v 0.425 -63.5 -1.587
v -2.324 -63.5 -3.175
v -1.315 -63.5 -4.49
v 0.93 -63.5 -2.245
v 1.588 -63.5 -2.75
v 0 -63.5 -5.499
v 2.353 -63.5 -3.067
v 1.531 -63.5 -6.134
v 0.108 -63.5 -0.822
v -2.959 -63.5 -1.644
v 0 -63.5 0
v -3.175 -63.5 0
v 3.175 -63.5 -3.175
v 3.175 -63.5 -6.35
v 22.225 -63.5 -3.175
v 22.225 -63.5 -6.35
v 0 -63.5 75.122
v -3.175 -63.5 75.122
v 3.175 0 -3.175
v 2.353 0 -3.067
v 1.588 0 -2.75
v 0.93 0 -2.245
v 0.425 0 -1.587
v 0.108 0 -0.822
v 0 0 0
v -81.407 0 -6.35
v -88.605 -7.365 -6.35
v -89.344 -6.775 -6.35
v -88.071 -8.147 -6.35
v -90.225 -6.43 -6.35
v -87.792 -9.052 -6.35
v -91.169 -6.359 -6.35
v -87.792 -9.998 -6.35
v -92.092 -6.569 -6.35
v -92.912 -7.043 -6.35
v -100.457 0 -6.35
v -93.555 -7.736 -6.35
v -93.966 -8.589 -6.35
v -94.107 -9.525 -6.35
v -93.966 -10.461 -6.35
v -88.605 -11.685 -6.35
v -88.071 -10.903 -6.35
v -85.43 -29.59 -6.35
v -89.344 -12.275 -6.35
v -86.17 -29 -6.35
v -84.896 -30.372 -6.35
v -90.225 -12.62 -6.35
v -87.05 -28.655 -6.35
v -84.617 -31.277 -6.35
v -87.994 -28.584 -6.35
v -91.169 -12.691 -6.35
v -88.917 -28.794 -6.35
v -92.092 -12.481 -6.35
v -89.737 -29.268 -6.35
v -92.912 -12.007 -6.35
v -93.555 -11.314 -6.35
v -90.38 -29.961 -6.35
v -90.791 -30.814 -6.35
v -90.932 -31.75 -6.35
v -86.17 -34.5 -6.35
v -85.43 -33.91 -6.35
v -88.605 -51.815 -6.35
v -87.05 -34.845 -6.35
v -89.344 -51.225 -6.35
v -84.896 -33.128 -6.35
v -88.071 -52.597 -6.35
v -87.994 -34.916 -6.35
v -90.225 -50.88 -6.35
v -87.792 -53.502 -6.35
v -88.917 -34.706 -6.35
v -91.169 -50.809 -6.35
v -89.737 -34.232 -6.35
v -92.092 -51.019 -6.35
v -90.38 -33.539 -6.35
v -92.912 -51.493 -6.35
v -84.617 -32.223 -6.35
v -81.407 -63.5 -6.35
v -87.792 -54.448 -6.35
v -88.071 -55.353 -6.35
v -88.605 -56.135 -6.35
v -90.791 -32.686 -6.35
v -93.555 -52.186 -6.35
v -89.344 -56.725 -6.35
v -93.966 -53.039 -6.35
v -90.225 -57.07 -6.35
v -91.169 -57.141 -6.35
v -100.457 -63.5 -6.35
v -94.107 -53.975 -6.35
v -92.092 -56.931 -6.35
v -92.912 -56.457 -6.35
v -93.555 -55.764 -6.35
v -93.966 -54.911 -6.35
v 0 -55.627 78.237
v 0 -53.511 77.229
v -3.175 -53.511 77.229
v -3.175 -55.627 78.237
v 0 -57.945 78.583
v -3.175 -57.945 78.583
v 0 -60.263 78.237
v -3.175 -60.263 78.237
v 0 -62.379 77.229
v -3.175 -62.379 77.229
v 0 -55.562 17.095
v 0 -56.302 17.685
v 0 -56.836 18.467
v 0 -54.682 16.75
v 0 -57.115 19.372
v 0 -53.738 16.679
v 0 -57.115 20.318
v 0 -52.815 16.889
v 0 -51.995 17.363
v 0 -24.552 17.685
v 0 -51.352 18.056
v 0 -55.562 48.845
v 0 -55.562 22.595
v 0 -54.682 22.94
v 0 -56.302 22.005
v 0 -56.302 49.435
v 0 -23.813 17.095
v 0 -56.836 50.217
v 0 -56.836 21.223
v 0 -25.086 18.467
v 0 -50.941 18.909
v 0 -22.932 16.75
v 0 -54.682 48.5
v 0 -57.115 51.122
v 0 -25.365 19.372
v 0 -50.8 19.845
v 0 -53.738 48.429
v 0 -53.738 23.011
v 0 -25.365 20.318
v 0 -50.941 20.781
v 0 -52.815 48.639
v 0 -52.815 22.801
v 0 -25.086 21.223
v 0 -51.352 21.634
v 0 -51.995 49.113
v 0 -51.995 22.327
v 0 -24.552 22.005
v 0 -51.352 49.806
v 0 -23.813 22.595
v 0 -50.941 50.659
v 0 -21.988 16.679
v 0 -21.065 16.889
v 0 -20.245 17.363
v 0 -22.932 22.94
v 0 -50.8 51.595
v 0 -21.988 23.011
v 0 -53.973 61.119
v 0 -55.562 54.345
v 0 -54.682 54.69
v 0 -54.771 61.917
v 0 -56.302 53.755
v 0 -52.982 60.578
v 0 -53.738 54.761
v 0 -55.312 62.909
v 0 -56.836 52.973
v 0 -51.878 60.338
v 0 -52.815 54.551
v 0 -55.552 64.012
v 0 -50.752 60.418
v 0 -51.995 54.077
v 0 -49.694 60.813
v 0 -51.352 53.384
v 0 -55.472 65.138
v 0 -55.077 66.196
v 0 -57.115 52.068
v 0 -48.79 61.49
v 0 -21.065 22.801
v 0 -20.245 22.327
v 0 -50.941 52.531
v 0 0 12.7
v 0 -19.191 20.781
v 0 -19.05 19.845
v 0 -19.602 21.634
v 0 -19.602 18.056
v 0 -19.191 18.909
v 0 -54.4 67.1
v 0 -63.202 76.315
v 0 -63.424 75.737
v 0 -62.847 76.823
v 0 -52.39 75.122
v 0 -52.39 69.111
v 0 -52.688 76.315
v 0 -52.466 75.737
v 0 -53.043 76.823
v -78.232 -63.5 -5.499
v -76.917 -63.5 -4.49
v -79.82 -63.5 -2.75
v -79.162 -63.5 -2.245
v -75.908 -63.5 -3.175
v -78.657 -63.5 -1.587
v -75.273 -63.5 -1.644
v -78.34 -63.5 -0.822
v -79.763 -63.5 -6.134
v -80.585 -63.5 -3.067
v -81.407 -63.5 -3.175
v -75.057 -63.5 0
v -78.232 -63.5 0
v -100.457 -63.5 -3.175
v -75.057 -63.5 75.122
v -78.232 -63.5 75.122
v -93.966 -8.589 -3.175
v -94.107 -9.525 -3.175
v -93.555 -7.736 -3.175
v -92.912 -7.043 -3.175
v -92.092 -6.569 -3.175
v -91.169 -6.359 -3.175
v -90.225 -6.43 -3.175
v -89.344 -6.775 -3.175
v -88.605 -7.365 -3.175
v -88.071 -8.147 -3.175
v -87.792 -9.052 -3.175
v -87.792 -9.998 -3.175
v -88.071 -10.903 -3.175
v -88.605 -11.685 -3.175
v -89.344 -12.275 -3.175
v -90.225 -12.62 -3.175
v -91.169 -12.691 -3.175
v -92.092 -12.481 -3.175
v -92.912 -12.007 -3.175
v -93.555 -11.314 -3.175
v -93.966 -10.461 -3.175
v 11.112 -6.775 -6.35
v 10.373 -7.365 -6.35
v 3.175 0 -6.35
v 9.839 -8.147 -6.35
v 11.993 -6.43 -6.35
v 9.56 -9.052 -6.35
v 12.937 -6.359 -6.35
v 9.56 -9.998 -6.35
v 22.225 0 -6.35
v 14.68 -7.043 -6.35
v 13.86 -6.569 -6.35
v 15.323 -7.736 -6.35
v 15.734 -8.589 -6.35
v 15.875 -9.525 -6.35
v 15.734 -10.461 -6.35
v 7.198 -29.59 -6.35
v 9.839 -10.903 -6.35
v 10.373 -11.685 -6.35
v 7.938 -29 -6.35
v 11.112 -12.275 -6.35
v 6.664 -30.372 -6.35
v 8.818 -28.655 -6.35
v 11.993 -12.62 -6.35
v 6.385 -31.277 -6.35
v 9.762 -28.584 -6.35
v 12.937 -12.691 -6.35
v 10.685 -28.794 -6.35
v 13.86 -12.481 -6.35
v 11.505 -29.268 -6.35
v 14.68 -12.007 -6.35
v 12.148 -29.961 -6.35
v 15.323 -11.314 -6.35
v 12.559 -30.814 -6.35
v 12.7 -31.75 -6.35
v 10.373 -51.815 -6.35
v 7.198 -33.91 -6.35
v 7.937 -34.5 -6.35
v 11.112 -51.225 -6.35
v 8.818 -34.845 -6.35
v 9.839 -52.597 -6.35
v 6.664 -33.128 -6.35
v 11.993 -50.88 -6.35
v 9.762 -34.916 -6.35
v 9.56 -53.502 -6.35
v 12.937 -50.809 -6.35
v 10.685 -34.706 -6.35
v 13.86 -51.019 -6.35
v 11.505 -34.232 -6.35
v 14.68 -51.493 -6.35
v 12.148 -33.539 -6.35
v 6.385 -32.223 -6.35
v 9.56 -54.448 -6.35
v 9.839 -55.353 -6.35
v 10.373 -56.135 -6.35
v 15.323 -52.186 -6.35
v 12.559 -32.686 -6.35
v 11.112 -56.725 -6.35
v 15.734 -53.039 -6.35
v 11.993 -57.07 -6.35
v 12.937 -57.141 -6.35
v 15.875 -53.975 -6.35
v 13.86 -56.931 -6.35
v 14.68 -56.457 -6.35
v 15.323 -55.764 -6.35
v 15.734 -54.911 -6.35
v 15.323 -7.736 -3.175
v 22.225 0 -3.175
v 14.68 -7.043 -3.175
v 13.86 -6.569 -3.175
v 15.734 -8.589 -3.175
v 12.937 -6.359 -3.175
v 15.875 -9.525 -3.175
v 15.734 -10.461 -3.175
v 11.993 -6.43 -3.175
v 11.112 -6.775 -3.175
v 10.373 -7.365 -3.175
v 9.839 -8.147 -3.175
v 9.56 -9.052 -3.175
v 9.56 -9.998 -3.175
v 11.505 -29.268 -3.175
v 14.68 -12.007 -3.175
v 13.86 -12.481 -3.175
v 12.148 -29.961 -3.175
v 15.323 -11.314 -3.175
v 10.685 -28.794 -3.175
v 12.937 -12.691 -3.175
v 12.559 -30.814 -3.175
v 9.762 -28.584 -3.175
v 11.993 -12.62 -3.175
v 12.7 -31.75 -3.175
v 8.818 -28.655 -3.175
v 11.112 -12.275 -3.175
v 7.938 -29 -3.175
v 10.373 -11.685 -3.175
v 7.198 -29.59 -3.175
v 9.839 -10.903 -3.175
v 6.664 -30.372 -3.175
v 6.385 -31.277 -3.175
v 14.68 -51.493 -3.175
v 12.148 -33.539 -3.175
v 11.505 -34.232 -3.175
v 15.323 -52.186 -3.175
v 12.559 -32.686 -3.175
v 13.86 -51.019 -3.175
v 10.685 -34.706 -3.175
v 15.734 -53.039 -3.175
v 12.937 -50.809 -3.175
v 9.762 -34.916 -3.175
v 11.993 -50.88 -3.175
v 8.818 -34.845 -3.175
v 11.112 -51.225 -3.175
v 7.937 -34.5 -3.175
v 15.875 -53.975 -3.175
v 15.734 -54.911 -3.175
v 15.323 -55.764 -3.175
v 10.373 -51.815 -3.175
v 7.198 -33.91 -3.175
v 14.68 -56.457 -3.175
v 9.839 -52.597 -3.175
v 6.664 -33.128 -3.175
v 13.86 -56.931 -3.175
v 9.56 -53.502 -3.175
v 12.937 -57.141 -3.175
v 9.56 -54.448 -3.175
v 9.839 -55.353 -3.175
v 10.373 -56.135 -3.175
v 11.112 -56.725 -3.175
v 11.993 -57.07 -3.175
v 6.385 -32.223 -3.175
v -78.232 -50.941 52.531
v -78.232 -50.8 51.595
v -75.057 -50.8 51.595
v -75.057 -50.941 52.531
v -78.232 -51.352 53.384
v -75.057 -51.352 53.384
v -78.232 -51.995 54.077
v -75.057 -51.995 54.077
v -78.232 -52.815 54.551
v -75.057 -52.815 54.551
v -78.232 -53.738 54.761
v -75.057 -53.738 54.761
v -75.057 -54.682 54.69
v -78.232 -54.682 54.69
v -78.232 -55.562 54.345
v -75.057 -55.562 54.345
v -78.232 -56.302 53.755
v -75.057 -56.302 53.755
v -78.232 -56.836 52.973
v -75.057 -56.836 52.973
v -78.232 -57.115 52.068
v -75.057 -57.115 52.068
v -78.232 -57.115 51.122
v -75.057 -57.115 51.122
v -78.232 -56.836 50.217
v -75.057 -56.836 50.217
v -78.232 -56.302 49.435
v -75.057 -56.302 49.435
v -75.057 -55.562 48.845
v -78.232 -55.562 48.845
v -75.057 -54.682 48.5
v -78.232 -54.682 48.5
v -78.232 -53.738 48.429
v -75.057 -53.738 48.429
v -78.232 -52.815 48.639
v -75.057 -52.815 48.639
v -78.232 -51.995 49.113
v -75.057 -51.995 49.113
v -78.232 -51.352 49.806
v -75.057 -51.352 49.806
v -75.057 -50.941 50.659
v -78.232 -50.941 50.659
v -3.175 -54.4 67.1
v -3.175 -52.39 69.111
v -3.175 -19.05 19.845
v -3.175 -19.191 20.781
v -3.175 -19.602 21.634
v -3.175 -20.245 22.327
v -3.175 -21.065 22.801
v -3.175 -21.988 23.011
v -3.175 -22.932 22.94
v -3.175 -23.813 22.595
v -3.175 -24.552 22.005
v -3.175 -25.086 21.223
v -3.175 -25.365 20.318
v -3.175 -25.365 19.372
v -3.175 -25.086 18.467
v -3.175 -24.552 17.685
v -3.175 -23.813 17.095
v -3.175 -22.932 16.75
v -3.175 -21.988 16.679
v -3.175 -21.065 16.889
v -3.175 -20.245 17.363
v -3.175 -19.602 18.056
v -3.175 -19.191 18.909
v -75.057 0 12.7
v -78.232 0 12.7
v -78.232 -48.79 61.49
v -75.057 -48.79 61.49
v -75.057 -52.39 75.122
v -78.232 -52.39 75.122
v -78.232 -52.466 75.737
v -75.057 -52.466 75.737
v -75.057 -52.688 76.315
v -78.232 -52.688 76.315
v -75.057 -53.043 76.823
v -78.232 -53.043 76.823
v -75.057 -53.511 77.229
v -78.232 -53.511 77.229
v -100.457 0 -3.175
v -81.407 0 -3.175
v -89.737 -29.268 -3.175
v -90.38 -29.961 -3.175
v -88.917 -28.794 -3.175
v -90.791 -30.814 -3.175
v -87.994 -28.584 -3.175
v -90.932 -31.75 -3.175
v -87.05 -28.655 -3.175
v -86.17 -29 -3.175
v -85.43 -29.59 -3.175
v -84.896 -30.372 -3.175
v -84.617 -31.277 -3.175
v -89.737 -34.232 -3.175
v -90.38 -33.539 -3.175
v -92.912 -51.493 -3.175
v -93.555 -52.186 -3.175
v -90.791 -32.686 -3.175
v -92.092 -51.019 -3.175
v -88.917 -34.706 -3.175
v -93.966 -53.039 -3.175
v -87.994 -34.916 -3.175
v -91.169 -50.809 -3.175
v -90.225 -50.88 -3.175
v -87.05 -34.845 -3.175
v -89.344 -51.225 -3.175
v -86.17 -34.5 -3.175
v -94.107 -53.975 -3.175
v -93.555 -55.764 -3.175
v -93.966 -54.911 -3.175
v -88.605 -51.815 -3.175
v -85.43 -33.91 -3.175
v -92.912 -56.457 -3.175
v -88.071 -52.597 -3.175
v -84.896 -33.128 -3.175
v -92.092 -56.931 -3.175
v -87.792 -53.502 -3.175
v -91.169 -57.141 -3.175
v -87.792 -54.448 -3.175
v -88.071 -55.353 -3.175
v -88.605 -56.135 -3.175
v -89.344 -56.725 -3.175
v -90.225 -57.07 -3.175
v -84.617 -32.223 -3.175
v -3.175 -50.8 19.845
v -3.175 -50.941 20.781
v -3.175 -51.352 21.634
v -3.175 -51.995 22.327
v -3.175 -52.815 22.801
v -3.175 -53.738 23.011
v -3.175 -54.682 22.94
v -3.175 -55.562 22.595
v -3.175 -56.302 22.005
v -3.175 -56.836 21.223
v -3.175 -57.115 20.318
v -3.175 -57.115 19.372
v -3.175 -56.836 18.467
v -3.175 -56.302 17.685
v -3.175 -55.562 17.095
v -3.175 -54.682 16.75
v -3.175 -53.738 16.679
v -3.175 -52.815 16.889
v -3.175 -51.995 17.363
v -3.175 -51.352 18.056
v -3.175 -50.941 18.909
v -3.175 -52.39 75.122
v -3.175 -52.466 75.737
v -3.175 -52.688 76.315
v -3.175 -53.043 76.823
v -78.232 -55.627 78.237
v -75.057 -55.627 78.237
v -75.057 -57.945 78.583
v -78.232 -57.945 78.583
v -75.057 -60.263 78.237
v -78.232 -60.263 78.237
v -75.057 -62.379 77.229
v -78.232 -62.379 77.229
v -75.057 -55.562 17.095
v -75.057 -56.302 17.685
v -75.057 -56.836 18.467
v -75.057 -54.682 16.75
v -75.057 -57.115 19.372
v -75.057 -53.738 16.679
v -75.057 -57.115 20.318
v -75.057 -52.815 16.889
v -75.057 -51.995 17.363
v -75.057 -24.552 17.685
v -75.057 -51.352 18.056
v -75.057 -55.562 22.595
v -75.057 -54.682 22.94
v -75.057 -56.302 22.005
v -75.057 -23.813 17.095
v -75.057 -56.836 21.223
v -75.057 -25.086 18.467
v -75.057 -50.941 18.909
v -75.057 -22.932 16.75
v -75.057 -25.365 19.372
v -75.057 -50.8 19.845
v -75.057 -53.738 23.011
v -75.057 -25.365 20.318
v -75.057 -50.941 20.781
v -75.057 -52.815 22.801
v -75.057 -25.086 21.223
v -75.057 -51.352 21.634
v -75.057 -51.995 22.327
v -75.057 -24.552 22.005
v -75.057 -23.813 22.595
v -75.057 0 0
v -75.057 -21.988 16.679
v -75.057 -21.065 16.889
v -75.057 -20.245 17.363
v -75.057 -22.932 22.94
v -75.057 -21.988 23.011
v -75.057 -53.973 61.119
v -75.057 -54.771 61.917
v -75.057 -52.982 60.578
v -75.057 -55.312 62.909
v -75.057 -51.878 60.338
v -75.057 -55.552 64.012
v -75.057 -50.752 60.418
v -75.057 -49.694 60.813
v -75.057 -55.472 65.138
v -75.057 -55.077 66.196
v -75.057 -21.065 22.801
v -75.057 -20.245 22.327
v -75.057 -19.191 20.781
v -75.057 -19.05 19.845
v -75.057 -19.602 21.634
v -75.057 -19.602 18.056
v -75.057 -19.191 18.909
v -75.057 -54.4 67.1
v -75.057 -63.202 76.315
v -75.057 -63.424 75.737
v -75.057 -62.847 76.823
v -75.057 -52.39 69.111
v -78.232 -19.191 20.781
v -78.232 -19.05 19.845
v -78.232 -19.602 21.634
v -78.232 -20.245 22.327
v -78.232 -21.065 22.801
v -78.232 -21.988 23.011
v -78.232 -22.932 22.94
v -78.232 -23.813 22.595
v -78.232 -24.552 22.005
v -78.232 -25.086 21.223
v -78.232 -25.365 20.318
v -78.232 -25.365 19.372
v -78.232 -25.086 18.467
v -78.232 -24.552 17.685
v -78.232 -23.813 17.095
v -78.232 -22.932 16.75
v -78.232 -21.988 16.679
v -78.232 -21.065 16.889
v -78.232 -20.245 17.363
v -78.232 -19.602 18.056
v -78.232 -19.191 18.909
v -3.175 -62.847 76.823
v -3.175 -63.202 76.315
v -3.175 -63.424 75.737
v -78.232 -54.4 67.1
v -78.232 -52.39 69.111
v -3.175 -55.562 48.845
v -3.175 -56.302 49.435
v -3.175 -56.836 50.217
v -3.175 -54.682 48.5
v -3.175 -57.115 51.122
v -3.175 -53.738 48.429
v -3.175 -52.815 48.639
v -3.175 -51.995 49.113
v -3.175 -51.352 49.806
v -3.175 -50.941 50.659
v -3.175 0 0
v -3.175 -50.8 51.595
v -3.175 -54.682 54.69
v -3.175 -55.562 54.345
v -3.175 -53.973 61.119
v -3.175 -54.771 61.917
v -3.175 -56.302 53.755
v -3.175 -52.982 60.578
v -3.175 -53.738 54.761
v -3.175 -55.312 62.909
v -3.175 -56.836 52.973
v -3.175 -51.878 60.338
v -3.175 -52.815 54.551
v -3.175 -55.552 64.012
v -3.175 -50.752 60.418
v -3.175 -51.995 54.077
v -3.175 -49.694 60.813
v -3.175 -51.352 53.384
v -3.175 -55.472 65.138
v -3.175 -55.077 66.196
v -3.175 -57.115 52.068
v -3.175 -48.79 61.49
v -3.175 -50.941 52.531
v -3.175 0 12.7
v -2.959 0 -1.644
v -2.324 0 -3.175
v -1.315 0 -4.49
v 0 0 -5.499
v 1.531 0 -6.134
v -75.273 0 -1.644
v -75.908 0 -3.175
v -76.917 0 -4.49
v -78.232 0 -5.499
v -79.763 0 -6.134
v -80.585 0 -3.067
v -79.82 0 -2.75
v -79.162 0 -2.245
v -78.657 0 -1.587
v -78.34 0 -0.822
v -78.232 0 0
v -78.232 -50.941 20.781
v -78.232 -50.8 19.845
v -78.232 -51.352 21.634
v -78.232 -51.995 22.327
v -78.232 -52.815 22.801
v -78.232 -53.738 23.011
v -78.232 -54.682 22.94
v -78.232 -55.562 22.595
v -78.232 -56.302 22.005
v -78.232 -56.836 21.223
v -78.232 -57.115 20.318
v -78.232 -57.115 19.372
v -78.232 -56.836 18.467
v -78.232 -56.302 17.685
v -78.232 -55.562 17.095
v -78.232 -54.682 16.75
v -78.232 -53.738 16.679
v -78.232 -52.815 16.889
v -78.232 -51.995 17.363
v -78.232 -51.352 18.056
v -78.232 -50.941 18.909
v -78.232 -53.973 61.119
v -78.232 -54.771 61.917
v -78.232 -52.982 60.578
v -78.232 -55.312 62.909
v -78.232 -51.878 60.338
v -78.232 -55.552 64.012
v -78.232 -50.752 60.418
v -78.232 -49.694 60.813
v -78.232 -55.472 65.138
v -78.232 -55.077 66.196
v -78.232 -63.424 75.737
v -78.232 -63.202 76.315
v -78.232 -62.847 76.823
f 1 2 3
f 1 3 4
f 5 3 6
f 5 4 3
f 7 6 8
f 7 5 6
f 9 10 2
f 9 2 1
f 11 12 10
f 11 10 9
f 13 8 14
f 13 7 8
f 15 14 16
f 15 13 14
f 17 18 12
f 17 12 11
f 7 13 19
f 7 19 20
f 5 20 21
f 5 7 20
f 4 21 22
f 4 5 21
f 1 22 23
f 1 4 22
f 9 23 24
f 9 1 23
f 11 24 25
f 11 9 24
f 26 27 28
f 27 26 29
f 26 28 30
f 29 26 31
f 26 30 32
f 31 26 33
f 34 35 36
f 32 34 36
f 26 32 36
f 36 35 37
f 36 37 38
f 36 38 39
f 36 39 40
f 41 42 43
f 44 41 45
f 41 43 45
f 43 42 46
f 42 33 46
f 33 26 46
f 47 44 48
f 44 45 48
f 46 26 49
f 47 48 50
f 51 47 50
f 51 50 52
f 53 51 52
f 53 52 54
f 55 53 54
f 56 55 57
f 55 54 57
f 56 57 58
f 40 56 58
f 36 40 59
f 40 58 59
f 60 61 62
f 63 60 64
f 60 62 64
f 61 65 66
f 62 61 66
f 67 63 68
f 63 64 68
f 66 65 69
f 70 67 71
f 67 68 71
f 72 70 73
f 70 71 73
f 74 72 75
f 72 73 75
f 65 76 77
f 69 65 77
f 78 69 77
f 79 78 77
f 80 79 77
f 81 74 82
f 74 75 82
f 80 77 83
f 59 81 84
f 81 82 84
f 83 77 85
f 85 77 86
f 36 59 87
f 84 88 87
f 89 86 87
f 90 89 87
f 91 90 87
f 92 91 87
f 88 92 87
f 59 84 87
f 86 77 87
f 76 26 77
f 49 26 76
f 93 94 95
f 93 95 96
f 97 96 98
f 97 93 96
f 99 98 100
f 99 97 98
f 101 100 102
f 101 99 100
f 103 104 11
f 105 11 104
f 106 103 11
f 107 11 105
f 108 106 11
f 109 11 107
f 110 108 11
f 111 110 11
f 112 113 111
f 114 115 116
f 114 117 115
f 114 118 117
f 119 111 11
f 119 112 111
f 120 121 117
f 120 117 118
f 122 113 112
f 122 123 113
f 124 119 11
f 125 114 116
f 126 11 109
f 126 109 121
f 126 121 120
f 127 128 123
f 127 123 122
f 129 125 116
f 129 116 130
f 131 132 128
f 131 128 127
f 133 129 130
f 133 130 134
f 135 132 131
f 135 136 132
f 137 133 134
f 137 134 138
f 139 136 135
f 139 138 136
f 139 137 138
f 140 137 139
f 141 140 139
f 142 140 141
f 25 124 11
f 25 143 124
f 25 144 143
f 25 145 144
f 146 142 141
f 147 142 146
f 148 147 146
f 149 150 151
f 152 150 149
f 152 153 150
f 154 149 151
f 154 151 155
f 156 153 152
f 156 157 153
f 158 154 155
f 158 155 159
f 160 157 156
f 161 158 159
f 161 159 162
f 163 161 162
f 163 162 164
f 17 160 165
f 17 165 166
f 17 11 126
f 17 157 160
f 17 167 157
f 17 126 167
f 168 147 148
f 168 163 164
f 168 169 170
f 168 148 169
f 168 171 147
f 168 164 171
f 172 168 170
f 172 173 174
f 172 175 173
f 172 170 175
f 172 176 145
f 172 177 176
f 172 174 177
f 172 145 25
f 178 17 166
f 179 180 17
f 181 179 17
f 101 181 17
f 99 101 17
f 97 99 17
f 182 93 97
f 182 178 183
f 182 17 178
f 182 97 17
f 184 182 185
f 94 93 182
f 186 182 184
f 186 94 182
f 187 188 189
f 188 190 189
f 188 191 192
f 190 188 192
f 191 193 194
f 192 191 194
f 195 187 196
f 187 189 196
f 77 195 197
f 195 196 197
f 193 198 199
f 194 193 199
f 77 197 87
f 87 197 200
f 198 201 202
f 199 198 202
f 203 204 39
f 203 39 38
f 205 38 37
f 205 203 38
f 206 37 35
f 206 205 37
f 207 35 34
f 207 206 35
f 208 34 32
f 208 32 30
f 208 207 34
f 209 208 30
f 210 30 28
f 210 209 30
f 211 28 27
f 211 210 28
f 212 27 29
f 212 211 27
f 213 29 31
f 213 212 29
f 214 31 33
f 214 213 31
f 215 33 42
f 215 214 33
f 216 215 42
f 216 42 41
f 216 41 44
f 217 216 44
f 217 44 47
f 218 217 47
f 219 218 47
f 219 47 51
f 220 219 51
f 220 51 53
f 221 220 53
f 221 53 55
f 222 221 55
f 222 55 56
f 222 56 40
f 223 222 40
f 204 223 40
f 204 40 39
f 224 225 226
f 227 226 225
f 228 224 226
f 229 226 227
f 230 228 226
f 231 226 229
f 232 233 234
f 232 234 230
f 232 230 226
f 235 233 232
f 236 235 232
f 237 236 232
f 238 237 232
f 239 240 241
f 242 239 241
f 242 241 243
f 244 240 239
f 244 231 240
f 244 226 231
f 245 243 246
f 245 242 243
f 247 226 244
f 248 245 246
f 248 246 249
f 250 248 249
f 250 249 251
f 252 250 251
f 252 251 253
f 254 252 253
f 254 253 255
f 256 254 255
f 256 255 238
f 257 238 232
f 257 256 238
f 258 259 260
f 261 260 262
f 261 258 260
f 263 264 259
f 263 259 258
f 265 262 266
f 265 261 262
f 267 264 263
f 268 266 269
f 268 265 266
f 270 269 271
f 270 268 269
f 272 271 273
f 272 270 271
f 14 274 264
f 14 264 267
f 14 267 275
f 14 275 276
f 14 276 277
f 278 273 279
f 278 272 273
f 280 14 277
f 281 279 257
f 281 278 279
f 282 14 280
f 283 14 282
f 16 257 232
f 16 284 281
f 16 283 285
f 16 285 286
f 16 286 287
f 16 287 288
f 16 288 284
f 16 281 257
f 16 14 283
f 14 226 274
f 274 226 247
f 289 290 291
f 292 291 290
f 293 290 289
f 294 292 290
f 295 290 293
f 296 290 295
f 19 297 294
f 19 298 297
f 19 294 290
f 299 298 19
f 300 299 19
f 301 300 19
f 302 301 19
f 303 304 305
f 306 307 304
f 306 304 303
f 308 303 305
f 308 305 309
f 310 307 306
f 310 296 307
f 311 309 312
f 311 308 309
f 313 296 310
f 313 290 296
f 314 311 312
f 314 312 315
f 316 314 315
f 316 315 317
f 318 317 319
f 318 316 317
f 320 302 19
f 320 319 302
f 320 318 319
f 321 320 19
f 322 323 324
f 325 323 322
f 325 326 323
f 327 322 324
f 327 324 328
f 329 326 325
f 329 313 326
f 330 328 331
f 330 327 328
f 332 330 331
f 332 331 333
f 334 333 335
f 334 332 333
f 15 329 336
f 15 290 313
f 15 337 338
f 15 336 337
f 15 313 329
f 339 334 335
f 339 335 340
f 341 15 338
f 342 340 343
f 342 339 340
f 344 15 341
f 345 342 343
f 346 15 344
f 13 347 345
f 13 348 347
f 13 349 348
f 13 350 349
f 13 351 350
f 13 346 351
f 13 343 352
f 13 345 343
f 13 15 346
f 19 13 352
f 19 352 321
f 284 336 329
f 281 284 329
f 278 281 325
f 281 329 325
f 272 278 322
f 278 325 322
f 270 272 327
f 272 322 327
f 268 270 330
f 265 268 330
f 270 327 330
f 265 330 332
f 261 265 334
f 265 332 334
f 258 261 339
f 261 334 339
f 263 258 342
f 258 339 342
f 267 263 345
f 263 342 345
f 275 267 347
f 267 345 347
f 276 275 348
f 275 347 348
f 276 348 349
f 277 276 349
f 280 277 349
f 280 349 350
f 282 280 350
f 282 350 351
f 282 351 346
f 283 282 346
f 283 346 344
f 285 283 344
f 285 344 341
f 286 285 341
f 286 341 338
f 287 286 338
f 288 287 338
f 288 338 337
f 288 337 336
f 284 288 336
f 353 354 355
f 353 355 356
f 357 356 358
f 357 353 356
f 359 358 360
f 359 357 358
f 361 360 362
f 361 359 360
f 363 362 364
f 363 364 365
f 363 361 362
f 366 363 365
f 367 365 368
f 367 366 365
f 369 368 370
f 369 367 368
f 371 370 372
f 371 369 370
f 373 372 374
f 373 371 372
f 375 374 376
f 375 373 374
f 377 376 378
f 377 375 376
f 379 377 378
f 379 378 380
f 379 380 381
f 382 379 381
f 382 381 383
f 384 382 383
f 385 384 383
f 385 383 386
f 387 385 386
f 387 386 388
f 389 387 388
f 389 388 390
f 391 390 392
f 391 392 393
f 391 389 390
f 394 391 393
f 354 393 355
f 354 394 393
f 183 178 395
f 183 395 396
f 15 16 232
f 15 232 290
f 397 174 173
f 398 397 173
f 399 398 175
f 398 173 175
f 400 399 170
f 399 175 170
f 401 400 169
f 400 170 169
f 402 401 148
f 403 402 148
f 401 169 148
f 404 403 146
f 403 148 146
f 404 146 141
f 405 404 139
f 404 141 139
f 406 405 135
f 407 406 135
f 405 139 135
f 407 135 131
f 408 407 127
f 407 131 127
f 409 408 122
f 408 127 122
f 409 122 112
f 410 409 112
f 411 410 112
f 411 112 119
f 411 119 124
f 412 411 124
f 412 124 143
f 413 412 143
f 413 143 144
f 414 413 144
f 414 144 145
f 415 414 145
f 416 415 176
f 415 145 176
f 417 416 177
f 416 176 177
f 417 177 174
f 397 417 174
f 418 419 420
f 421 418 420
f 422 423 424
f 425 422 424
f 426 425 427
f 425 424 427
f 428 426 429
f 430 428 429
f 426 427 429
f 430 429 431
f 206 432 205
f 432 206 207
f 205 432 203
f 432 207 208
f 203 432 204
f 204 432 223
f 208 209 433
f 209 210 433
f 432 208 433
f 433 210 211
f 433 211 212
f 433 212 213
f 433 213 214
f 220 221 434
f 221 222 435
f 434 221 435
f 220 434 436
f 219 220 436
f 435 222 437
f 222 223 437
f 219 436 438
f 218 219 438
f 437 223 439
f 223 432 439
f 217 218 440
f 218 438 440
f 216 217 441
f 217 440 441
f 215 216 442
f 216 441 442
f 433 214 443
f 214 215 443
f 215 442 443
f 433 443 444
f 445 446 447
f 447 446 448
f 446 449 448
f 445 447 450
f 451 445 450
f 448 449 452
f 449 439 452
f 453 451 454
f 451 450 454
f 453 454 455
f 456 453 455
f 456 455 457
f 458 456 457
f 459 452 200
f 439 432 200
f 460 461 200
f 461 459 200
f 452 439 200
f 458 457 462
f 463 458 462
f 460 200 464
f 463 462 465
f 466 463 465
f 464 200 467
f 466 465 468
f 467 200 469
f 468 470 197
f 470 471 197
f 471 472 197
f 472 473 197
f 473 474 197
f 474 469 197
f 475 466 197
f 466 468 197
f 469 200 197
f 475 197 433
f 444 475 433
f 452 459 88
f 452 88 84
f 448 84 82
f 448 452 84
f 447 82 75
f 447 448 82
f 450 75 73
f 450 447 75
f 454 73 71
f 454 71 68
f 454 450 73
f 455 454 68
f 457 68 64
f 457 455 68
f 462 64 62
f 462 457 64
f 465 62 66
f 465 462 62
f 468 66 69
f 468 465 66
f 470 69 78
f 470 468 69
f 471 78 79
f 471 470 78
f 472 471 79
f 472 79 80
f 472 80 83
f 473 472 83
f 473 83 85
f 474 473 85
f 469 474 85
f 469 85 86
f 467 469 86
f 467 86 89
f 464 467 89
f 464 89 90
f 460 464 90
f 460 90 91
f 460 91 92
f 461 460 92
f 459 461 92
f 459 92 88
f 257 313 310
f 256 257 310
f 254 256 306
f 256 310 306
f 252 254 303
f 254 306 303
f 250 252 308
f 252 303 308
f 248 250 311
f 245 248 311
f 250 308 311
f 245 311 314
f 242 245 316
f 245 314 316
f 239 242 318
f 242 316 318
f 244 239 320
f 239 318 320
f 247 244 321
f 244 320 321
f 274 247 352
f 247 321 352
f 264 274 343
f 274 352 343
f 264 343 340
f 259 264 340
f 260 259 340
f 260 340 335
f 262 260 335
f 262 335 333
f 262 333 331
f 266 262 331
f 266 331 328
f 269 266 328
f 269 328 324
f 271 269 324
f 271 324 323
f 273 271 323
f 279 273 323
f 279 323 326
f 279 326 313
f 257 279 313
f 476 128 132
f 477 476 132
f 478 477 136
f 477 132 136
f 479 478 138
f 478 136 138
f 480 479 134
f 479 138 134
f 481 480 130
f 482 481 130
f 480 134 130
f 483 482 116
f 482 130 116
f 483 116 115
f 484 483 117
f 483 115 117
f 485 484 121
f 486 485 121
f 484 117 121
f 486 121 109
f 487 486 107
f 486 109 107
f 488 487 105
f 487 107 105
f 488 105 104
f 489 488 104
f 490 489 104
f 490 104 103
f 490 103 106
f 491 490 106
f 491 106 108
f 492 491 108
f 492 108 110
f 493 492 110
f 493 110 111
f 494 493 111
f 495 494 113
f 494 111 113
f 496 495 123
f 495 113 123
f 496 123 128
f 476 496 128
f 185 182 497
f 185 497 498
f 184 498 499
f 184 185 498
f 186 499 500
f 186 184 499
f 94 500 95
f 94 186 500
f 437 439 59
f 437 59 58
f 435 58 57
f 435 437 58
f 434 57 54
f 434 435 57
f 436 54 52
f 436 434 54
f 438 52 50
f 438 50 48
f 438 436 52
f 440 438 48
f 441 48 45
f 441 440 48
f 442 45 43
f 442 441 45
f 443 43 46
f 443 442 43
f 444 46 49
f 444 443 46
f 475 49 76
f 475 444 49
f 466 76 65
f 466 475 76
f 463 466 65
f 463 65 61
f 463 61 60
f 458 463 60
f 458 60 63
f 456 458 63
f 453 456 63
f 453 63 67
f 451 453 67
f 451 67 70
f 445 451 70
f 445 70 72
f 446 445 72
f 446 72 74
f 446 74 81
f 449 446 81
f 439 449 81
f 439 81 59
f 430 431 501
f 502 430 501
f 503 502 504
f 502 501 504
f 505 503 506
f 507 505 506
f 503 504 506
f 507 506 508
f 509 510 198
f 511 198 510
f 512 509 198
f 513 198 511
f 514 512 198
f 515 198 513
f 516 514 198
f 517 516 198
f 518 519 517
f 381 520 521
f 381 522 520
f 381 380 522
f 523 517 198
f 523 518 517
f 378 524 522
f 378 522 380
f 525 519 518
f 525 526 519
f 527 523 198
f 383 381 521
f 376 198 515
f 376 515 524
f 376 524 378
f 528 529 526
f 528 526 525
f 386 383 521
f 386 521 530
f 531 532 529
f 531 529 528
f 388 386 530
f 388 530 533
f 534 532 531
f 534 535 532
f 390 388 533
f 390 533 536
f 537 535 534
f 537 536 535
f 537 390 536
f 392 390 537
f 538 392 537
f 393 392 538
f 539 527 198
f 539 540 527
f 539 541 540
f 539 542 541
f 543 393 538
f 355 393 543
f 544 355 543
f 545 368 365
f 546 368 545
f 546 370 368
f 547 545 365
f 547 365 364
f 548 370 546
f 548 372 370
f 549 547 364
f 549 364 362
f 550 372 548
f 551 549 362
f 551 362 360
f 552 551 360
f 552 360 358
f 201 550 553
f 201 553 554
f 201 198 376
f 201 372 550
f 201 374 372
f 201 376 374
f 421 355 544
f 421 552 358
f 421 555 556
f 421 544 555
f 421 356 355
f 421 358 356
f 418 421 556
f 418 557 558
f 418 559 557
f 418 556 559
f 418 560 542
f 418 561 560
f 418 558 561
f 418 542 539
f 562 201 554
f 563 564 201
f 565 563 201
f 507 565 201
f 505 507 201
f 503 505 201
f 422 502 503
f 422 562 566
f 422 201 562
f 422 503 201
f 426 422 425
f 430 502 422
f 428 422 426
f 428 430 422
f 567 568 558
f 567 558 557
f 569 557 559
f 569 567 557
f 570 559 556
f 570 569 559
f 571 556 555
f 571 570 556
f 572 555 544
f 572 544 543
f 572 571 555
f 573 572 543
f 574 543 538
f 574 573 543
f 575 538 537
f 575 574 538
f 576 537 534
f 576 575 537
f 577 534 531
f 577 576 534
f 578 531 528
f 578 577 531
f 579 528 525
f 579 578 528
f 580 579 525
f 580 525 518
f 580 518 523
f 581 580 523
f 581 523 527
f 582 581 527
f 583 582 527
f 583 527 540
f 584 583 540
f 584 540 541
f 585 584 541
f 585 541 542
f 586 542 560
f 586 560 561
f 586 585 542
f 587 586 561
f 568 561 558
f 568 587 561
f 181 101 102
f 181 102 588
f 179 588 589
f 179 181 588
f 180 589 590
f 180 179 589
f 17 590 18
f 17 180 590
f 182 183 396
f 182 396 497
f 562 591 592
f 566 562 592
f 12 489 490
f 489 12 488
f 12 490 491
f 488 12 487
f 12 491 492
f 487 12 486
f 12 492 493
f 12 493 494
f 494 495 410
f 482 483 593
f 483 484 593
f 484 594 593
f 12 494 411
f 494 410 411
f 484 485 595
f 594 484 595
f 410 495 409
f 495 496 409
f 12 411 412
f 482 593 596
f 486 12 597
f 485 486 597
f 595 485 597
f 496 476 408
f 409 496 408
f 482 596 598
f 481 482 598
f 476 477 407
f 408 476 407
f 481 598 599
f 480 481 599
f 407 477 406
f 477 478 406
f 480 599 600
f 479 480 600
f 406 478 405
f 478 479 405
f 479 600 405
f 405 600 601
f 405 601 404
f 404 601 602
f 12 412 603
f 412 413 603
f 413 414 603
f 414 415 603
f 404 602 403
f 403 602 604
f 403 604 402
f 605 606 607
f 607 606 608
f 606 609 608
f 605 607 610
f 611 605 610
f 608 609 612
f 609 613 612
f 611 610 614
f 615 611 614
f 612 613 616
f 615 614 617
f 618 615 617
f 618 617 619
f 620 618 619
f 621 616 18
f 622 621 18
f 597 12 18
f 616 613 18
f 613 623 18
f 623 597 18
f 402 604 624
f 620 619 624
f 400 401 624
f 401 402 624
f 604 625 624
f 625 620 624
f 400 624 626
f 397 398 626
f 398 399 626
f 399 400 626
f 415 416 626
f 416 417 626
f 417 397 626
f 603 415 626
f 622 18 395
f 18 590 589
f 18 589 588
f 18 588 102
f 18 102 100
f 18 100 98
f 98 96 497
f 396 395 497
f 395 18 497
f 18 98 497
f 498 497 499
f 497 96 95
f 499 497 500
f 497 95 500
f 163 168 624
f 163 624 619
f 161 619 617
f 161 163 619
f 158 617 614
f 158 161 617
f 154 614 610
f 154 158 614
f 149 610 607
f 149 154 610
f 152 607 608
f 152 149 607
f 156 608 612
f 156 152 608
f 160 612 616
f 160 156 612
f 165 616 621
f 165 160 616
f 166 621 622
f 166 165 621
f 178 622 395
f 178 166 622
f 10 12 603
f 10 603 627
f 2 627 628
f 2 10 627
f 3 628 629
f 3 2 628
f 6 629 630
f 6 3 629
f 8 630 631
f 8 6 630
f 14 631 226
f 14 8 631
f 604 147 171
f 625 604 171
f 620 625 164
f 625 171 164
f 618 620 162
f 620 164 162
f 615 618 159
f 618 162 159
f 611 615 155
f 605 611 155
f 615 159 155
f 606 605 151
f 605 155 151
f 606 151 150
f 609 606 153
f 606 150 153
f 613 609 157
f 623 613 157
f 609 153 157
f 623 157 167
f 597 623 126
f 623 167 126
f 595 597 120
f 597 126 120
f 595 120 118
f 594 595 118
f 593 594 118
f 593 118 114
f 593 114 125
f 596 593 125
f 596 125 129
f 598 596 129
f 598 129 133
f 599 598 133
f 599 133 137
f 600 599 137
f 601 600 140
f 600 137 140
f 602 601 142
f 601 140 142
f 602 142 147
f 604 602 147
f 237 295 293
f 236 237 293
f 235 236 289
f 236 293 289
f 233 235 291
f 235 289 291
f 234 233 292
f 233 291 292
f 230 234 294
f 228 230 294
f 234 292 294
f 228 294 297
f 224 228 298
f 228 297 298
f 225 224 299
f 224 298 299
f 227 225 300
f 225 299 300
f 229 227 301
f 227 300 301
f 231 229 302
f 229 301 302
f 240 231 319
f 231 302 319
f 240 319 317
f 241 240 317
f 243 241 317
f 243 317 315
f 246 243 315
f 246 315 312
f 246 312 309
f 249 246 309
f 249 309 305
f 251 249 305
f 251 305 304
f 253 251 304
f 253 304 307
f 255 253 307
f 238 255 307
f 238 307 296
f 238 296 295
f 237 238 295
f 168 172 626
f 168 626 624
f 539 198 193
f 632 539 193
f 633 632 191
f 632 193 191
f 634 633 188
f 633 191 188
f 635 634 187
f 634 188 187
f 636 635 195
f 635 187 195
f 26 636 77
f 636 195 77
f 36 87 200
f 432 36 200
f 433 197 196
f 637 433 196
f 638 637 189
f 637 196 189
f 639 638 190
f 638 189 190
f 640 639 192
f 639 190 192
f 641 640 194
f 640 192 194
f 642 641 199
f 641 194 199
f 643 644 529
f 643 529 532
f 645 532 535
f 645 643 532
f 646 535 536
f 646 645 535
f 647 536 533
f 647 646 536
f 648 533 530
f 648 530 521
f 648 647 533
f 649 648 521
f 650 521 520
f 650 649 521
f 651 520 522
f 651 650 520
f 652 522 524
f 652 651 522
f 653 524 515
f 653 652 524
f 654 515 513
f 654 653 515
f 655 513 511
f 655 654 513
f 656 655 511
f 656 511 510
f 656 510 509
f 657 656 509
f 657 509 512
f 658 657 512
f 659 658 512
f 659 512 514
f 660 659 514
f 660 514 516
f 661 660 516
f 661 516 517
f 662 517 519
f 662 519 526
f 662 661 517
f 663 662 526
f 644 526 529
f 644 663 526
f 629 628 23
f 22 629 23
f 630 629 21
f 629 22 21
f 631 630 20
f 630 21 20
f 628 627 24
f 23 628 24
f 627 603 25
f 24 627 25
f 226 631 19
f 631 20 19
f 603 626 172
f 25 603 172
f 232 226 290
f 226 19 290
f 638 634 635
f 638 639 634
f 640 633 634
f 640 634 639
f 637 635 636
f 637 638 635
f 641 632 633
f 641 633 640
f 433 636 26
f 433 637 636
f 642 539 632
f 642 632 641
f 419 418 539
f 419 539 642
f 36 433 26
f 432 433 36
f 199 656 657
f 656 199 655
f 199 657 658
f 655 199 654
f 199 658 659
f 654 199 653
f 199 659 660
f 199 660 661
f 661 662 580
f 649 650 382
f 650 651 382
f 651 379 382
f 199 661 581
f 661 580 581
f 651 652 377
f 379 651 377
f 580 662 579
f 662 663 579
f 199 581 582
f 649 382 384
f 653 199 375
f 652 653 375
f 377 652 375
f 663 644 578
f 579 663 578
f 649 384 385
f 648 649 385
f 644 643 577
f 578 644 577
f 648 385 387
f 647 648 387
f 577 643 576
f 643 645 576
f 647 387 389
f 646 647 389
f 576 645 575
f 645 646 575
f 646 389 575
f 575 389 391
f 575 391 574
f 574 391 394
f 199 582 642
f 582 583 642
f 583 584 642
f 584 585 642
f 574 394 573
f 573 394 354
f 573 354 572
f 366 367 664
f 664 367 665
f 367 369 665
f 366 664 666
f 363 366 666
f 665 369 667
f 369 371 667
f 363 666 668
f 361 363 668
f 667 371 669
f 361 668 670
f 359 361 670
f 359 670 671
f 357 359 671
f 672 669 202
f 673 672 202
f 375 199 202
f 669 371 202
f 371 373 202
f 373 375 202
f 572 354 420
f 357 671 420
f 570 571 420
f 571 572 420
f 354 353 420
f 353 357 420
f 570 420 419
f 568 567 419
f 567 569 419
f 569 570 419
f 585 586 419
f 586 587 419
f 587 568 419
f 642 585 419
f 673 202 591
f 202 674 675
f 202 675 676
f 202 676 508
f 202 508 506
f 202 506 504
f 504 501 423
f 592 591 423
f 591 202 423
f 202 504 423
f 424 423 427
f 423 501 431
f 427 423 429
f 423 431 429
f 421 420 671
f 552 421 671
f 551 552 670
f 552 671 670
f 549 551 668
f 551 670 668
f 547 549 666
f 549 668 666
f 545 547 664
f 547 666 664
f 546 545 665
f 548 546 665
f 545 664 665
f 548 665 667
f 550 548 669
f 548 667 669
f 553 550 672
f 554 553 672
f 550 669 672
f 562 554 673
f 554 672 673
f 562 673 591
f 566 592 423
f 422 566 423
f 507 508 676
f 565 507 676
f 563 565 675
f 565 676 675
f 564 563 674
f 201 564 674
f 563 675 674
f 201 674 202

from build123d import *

# Parameters (mm, degrees)
F0_R     = 3.175
F1_DEPTH = 3.175
F3_DEPTH = 63.5
F4_R     = 3.175
F5_DEPTH = 3.176


with BuildPart() as f1:
    # F0 (on Right) → F1 (new body)
    with BuildSketch(Plane.YZ):
        with BuildLine():
            ThreePointArc((-52.39004, 75.12195), (-52.687788, 76.315225), (-53.511226, 77.228741))
            ThreePointArc((-53.511226, 77.228741), (-57.94502, 78.58252), (-62.378814, 77.228741))
            ThreePointArc((-62.378814, 77.228741), (-63.202252, 76.315225), (-63.5, 75.12195))
            Line((-63.5, 75.12195), (-63.5, 0))
            Line((-63.5, 0), (0, 0))
            Line((0, 0), (0, 12.7))
            Line((0, 12.7), (-48.789588, 61.489588))
            ThreePointArc((-48.789588, 61.489588), (-54.400452, 61.489588), (-54.400452, 67.100452))
            Line((-54.400452, 67.100452), (-52.39004, 69.110864))
            Line((-52.39004, 69.110864), (-52.39004, 75.12195))
        make_face()
        with Locations((-53.975, 19.84502)):
            Circle(F0_R, mode=Mode.SUBTRACT)
        with Locations((-22.225, 19.84502)):
            Circle(F0_R, mode=Mode.SUBTRACT)
        with Locations((-53.975, 51.59502)):
            Circle(F0_R, mode=Mode.SUBTRACT)
    extrude(amount=-F1_DEPTH)

    # F2 (on face) → F3 (join, through all)
    with BuildSketch(Plane.XZ.offset(63.5)):
        with BuildLine():
            Line((0, 0), (-3.175, 0))
            ThreePointArc((-3.175, 0), (-1.315128, -4.490128), (3.175, -6.35))
            Line((3.175, -6.35), (22.225, -6.35))
            Line((22.225, -6.35), (22.225, -3.175))
            Line((22.225, -3.175), (3.175, -3.175))
            ThreePointArc((3.175, -3.175), (0.929936, -2.245064), (0, 0))
        make_face()
    extrude(amount=-F3_DEPTH)

    # F4 (on face) → F5 (cut, through all)
    with BuildSketch(Plane.XY.offset(-3.175)):
        with Locations((12.7, -53.975)):
            Circle(F4_R)
        with Locations((9.525, -31.75)):
            Circle(F4_R)
        with Locations((12.7, -9.525)):
            Circle(F4_R)
    extrude(amount=-F5_DEPTH, mode=Mode.SUBTRACT)


with BuildPart() as f7_1:
    # F7: instance of F1
    add(f1.part.mirror(Plane.YZ.offset(-39.116)))


solid = Compound([f1.part, f7_1.part])
